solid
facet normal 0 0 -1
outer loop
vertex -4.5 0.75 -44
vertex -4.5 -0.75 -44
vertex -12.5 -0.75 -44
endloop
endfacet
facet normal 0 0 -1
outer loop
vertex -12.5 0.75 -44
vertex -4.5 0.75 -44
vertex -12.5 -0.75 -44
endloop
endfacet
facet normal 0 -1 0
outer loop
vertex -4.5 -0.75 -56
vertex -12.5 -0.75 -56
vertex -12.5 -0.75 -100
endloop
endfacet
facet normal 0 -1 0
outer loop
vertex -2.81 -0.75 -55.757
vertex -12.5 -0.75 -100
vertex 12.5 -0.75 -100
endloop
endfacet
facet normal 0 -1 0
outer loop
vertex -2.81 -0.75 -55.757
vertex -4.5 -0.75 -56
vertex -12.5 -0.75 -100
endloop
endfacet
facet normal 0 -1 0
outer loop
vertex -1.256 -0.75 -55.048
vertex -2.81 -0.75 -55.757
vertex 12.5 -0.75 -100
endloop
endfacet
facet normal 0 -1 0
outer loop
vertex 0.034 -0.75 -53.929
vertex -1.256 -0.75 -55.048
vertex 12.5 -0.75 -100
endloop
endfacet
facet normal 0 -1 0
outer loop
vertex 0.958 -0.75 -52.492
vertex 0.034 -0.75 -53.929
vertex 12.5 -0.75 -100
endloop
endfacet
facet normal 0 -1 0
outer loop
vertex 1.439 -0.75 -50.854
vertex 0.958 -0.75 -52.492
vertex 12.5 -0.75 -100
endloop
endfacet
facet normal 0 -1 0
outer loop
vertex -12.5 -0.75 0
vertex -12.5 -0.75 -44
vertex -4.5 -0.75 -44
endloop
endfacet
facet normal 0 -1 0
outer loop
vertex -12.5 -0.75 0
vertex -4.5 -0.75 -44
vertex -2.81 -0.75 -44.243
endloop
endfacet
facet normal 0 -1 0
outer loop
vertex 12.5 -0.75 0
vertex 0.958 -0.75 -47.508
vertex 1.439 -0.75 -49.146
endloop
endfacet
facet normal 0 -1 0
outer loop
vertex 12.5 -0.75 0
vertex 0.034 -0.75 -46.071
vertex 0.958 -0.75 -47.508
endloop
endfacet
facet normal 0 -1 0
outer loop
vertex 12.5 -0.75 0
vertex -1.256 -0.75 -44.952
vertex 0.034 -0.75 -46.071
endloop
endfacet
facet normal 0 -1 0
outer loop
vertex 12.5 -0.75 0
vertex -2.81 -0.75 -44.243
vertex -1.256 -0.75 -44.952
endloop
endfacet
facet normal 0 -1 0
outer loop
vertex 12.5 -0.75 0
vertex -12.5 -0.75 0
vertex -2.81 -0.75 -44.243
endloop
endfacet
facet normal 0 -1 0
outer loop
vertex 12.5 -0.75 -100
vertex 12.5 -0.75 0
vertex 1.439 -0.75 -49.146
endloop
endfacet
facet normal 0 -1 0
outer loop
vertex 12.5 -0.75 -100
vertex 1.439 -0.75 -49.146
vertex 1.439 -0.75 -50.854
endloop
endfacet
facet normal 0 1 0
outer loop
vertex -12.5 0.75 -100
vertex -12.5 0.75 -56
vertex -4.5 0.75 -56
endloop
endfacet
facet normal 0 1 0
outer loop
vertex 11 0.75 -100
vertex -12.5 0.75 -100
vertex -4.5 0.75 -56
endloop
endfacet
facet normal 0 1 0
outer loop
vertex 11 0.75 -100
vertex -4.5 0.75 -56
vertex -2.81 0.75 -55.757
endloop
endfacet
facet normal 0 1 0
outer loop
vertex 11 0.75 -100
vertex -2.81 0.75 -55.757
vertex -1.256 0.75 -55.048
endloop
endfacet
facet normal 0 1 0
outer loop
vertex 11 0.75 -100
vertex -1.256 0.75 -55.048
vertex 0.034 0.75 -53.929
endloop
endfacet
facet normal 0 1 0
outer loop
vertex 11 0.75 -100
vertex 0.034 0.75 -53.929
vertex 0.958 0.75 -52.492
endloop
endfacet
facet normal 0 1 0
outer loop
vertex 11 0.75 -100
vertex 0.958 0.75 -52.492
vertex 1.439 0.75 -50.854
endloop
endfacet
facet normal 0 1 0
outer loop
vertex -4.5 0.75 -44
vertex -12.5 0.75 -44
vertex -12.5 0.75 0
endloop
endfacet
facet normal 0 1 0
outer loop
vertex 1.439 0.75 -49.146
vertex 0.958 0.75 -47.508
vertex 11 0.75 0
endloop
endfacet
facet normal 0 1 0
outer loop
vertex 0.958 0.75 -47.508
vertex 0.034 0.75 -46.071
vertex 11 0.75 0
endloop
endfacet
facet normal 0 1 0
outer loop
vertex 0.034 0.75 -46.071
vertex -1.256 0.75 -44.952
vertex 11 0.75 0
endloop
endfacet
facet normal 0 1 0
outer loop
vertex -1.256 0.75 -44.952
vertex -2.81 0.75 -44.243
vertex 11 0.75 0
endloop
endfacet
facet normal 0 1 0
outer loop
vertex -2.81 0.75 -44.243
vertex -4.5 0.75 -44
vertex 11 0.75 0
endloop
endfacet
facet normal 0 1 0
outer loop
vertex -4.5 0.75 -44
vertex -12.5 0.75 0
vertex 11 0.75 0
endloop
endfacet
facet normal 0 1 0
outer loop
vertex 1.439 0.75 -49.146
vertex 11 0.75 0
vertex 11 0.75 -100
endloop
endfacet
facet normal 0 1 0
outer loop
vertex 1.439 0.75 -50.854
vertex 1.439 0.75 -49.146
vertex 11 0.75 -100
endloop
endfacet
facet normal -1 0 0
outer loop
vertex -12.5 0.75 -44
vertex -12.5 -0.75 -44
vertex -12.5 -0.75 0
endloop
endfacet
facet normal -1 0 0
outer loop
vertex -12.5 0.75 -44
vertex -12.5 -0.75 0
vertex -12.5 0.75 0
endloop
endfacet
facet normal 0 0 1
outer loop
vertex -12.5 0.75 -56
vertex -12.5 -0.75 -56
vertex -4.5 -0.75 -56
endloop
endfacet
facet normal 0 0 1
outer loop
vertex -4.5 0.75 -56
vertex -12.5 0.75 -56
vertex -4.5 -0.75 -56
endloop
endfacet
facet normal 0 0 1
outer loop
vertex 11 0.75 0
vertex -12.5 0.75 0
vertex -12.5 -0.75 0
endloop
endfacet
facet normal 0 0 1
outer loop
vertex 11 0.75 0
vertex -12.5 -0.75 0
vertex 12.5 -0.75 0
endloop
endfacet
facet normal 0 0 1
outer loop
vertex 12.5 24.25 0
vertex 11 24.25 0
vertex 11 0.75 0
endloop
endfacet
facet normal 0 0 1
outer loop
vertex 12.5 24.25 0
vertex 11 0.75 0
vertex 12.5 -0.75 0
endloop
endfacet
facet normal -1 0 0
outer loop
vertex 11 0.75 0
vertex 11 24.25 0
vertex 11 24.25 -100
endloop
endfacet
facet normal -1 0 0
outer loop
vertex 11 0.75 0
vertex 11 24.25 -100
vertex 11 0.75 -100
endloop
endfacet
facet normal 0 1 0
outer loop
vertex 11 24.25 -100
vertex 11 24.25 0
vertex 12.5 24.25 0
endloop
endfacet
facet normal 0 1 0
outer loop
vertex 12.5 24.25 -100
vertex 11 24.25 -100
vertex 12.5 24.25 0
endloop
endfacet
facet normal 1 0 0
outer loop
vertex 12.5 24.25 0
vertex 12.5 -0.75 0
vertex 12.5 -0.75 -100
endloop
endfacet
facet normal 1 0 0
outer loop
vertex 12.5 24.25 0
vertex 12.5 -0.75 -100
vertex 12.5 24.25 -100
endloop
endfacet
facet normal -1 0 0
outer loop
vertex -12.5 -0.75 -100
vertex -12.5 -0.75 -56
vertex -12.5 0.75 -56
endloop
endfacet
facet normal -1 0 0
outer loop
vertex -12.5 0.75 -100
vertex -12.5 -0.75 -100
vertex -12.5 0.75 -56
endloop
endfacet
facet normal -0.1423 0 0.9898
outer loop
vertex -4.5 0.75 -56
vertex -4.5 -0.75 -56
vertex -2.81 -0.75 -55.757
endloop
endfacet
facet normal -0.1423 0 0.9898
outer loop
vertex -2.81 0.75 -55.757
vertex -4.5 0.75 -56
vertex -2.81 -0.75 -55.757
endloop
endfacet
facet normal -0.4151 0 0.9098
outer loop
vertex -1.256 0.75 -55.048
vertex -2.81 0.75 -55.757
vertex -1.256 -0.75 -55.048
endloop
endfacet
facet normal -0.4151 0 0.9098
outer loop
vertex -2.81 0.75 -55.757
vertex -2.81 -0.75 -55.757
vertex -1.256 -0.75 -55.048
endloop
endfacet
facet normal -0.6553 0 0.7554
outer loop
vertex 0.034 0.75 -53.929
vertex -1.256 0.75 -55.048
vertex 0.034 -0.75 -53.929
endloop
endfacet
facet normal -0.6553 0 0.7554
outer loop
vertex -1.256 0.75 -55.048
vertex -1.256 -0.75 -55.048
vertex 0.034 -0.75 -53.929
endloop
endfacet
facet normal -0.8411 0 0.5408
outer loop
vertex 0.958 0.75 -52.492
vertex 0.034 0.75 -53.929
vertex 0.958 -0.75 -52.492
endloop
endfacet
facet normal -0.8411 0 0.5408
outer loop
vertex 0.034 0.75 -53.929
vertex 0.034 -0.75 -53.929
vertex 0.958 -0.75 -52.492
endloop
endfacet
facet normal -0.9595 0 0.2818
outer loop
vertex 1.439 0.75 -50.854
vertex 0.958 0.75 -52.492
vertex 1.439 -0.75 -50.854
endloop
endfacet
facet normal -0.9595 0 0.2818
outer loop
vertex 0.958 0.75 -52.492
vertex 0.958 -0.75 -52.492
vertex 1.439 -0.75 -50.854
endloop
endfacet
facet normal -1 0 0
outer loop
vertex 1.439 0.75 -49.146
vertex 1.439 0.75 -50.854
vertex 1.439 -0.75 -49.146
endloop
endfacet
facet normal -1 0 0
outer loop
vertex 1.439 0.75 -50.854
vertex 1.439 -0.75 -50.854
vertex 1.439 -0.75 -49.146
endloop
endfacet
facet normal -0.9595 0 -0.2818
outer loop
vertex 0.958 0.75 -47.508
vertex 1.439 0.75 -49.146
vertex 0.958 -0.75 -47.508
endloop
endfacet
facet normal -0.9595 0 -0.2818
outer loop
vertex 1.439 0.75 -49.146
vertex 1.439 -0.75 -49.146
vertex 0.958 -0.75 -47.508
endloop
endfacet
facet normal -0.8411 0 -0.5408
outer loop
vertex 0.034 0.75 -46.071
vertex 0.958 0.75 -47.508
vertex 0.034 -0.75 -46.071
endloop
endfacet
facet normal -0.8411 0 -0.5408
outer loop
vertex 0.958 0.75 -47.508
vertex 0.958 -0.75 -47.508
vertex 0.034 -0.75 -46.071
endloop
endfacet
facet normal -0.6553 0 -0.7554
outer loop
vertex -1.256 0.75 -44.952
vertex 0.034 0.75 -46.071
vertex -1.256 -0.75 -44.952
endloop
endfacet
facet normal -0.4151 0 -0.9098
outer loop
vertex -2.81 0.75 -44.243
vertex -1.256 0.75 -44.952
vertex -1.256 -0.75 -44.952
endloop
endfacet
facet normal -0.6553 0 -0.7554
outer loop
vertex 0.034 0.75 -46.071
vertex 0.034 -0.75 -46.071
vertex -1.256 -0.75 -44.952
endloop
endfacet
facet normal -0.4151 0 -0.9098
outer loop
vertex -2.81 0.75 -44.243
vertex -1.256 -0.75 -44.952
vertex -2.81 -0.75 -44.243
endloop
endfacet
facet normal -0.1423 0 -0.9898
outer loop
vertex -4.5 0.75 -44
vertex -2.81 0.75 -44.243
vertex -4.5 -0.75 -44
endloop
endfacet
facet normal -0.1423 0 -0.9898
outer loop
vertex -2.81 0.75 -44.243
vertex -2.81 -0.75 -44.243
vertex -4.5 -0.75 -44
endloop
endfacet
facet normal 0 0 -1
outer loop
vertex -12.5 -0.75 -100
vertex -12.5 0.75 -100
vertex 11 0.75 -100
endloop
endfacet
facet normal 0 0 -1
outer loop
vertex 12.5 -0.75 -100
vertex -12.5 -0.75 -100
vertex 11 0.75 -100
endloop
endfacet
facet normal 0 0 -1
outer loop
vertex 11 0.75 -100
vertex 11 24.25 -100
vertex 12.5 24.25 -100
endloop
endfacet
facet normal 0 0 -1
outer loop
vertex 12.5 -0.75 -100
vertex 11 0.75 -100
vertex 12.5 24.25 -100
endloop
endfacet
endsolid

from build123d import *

# Parameters (mm, degrees)
F0_W     = 1.5
F0_H     = 1.5
F0_H_2   = 23.5
F0_W_2   = 23.5
F1_DEPTH = 100
F3_DEPTH = 1.5


with BuildPart() as f1:
    # F0 (on Top) → F1 (new body)
    with BuildSketch(Plane.XY):
        with Locations((11.75, 0)):
            Rectangle(F0_W, F0_H)
        with Locations((11.75, 12.5)):
            Rectangle(F0_W, F0_H_2)
        with Locations((-0.75, 0)):
            Rectangle(F0_W_2, F0_H)
    extrude(amount=-F1_DEPTH)

    # F2 (on face) → F3 (cut)
    with BuildSketch(Plane.XZ.offset(0.75)):
        with BuildLine():
            Line((-12.5, -56), (-4.5, -56))
            ThreePointArc((-4.5, -56), (1.5, -50), (-4.5, -44))
            Line((-4.5, -44), (-12.5, -44))
            Line((-12.5, -44), (-12.5, -56))
        make_face()
    extrude(amount=-F3_DEPTH, mode=Mode.SUBTRACT)


solid = f1.part
